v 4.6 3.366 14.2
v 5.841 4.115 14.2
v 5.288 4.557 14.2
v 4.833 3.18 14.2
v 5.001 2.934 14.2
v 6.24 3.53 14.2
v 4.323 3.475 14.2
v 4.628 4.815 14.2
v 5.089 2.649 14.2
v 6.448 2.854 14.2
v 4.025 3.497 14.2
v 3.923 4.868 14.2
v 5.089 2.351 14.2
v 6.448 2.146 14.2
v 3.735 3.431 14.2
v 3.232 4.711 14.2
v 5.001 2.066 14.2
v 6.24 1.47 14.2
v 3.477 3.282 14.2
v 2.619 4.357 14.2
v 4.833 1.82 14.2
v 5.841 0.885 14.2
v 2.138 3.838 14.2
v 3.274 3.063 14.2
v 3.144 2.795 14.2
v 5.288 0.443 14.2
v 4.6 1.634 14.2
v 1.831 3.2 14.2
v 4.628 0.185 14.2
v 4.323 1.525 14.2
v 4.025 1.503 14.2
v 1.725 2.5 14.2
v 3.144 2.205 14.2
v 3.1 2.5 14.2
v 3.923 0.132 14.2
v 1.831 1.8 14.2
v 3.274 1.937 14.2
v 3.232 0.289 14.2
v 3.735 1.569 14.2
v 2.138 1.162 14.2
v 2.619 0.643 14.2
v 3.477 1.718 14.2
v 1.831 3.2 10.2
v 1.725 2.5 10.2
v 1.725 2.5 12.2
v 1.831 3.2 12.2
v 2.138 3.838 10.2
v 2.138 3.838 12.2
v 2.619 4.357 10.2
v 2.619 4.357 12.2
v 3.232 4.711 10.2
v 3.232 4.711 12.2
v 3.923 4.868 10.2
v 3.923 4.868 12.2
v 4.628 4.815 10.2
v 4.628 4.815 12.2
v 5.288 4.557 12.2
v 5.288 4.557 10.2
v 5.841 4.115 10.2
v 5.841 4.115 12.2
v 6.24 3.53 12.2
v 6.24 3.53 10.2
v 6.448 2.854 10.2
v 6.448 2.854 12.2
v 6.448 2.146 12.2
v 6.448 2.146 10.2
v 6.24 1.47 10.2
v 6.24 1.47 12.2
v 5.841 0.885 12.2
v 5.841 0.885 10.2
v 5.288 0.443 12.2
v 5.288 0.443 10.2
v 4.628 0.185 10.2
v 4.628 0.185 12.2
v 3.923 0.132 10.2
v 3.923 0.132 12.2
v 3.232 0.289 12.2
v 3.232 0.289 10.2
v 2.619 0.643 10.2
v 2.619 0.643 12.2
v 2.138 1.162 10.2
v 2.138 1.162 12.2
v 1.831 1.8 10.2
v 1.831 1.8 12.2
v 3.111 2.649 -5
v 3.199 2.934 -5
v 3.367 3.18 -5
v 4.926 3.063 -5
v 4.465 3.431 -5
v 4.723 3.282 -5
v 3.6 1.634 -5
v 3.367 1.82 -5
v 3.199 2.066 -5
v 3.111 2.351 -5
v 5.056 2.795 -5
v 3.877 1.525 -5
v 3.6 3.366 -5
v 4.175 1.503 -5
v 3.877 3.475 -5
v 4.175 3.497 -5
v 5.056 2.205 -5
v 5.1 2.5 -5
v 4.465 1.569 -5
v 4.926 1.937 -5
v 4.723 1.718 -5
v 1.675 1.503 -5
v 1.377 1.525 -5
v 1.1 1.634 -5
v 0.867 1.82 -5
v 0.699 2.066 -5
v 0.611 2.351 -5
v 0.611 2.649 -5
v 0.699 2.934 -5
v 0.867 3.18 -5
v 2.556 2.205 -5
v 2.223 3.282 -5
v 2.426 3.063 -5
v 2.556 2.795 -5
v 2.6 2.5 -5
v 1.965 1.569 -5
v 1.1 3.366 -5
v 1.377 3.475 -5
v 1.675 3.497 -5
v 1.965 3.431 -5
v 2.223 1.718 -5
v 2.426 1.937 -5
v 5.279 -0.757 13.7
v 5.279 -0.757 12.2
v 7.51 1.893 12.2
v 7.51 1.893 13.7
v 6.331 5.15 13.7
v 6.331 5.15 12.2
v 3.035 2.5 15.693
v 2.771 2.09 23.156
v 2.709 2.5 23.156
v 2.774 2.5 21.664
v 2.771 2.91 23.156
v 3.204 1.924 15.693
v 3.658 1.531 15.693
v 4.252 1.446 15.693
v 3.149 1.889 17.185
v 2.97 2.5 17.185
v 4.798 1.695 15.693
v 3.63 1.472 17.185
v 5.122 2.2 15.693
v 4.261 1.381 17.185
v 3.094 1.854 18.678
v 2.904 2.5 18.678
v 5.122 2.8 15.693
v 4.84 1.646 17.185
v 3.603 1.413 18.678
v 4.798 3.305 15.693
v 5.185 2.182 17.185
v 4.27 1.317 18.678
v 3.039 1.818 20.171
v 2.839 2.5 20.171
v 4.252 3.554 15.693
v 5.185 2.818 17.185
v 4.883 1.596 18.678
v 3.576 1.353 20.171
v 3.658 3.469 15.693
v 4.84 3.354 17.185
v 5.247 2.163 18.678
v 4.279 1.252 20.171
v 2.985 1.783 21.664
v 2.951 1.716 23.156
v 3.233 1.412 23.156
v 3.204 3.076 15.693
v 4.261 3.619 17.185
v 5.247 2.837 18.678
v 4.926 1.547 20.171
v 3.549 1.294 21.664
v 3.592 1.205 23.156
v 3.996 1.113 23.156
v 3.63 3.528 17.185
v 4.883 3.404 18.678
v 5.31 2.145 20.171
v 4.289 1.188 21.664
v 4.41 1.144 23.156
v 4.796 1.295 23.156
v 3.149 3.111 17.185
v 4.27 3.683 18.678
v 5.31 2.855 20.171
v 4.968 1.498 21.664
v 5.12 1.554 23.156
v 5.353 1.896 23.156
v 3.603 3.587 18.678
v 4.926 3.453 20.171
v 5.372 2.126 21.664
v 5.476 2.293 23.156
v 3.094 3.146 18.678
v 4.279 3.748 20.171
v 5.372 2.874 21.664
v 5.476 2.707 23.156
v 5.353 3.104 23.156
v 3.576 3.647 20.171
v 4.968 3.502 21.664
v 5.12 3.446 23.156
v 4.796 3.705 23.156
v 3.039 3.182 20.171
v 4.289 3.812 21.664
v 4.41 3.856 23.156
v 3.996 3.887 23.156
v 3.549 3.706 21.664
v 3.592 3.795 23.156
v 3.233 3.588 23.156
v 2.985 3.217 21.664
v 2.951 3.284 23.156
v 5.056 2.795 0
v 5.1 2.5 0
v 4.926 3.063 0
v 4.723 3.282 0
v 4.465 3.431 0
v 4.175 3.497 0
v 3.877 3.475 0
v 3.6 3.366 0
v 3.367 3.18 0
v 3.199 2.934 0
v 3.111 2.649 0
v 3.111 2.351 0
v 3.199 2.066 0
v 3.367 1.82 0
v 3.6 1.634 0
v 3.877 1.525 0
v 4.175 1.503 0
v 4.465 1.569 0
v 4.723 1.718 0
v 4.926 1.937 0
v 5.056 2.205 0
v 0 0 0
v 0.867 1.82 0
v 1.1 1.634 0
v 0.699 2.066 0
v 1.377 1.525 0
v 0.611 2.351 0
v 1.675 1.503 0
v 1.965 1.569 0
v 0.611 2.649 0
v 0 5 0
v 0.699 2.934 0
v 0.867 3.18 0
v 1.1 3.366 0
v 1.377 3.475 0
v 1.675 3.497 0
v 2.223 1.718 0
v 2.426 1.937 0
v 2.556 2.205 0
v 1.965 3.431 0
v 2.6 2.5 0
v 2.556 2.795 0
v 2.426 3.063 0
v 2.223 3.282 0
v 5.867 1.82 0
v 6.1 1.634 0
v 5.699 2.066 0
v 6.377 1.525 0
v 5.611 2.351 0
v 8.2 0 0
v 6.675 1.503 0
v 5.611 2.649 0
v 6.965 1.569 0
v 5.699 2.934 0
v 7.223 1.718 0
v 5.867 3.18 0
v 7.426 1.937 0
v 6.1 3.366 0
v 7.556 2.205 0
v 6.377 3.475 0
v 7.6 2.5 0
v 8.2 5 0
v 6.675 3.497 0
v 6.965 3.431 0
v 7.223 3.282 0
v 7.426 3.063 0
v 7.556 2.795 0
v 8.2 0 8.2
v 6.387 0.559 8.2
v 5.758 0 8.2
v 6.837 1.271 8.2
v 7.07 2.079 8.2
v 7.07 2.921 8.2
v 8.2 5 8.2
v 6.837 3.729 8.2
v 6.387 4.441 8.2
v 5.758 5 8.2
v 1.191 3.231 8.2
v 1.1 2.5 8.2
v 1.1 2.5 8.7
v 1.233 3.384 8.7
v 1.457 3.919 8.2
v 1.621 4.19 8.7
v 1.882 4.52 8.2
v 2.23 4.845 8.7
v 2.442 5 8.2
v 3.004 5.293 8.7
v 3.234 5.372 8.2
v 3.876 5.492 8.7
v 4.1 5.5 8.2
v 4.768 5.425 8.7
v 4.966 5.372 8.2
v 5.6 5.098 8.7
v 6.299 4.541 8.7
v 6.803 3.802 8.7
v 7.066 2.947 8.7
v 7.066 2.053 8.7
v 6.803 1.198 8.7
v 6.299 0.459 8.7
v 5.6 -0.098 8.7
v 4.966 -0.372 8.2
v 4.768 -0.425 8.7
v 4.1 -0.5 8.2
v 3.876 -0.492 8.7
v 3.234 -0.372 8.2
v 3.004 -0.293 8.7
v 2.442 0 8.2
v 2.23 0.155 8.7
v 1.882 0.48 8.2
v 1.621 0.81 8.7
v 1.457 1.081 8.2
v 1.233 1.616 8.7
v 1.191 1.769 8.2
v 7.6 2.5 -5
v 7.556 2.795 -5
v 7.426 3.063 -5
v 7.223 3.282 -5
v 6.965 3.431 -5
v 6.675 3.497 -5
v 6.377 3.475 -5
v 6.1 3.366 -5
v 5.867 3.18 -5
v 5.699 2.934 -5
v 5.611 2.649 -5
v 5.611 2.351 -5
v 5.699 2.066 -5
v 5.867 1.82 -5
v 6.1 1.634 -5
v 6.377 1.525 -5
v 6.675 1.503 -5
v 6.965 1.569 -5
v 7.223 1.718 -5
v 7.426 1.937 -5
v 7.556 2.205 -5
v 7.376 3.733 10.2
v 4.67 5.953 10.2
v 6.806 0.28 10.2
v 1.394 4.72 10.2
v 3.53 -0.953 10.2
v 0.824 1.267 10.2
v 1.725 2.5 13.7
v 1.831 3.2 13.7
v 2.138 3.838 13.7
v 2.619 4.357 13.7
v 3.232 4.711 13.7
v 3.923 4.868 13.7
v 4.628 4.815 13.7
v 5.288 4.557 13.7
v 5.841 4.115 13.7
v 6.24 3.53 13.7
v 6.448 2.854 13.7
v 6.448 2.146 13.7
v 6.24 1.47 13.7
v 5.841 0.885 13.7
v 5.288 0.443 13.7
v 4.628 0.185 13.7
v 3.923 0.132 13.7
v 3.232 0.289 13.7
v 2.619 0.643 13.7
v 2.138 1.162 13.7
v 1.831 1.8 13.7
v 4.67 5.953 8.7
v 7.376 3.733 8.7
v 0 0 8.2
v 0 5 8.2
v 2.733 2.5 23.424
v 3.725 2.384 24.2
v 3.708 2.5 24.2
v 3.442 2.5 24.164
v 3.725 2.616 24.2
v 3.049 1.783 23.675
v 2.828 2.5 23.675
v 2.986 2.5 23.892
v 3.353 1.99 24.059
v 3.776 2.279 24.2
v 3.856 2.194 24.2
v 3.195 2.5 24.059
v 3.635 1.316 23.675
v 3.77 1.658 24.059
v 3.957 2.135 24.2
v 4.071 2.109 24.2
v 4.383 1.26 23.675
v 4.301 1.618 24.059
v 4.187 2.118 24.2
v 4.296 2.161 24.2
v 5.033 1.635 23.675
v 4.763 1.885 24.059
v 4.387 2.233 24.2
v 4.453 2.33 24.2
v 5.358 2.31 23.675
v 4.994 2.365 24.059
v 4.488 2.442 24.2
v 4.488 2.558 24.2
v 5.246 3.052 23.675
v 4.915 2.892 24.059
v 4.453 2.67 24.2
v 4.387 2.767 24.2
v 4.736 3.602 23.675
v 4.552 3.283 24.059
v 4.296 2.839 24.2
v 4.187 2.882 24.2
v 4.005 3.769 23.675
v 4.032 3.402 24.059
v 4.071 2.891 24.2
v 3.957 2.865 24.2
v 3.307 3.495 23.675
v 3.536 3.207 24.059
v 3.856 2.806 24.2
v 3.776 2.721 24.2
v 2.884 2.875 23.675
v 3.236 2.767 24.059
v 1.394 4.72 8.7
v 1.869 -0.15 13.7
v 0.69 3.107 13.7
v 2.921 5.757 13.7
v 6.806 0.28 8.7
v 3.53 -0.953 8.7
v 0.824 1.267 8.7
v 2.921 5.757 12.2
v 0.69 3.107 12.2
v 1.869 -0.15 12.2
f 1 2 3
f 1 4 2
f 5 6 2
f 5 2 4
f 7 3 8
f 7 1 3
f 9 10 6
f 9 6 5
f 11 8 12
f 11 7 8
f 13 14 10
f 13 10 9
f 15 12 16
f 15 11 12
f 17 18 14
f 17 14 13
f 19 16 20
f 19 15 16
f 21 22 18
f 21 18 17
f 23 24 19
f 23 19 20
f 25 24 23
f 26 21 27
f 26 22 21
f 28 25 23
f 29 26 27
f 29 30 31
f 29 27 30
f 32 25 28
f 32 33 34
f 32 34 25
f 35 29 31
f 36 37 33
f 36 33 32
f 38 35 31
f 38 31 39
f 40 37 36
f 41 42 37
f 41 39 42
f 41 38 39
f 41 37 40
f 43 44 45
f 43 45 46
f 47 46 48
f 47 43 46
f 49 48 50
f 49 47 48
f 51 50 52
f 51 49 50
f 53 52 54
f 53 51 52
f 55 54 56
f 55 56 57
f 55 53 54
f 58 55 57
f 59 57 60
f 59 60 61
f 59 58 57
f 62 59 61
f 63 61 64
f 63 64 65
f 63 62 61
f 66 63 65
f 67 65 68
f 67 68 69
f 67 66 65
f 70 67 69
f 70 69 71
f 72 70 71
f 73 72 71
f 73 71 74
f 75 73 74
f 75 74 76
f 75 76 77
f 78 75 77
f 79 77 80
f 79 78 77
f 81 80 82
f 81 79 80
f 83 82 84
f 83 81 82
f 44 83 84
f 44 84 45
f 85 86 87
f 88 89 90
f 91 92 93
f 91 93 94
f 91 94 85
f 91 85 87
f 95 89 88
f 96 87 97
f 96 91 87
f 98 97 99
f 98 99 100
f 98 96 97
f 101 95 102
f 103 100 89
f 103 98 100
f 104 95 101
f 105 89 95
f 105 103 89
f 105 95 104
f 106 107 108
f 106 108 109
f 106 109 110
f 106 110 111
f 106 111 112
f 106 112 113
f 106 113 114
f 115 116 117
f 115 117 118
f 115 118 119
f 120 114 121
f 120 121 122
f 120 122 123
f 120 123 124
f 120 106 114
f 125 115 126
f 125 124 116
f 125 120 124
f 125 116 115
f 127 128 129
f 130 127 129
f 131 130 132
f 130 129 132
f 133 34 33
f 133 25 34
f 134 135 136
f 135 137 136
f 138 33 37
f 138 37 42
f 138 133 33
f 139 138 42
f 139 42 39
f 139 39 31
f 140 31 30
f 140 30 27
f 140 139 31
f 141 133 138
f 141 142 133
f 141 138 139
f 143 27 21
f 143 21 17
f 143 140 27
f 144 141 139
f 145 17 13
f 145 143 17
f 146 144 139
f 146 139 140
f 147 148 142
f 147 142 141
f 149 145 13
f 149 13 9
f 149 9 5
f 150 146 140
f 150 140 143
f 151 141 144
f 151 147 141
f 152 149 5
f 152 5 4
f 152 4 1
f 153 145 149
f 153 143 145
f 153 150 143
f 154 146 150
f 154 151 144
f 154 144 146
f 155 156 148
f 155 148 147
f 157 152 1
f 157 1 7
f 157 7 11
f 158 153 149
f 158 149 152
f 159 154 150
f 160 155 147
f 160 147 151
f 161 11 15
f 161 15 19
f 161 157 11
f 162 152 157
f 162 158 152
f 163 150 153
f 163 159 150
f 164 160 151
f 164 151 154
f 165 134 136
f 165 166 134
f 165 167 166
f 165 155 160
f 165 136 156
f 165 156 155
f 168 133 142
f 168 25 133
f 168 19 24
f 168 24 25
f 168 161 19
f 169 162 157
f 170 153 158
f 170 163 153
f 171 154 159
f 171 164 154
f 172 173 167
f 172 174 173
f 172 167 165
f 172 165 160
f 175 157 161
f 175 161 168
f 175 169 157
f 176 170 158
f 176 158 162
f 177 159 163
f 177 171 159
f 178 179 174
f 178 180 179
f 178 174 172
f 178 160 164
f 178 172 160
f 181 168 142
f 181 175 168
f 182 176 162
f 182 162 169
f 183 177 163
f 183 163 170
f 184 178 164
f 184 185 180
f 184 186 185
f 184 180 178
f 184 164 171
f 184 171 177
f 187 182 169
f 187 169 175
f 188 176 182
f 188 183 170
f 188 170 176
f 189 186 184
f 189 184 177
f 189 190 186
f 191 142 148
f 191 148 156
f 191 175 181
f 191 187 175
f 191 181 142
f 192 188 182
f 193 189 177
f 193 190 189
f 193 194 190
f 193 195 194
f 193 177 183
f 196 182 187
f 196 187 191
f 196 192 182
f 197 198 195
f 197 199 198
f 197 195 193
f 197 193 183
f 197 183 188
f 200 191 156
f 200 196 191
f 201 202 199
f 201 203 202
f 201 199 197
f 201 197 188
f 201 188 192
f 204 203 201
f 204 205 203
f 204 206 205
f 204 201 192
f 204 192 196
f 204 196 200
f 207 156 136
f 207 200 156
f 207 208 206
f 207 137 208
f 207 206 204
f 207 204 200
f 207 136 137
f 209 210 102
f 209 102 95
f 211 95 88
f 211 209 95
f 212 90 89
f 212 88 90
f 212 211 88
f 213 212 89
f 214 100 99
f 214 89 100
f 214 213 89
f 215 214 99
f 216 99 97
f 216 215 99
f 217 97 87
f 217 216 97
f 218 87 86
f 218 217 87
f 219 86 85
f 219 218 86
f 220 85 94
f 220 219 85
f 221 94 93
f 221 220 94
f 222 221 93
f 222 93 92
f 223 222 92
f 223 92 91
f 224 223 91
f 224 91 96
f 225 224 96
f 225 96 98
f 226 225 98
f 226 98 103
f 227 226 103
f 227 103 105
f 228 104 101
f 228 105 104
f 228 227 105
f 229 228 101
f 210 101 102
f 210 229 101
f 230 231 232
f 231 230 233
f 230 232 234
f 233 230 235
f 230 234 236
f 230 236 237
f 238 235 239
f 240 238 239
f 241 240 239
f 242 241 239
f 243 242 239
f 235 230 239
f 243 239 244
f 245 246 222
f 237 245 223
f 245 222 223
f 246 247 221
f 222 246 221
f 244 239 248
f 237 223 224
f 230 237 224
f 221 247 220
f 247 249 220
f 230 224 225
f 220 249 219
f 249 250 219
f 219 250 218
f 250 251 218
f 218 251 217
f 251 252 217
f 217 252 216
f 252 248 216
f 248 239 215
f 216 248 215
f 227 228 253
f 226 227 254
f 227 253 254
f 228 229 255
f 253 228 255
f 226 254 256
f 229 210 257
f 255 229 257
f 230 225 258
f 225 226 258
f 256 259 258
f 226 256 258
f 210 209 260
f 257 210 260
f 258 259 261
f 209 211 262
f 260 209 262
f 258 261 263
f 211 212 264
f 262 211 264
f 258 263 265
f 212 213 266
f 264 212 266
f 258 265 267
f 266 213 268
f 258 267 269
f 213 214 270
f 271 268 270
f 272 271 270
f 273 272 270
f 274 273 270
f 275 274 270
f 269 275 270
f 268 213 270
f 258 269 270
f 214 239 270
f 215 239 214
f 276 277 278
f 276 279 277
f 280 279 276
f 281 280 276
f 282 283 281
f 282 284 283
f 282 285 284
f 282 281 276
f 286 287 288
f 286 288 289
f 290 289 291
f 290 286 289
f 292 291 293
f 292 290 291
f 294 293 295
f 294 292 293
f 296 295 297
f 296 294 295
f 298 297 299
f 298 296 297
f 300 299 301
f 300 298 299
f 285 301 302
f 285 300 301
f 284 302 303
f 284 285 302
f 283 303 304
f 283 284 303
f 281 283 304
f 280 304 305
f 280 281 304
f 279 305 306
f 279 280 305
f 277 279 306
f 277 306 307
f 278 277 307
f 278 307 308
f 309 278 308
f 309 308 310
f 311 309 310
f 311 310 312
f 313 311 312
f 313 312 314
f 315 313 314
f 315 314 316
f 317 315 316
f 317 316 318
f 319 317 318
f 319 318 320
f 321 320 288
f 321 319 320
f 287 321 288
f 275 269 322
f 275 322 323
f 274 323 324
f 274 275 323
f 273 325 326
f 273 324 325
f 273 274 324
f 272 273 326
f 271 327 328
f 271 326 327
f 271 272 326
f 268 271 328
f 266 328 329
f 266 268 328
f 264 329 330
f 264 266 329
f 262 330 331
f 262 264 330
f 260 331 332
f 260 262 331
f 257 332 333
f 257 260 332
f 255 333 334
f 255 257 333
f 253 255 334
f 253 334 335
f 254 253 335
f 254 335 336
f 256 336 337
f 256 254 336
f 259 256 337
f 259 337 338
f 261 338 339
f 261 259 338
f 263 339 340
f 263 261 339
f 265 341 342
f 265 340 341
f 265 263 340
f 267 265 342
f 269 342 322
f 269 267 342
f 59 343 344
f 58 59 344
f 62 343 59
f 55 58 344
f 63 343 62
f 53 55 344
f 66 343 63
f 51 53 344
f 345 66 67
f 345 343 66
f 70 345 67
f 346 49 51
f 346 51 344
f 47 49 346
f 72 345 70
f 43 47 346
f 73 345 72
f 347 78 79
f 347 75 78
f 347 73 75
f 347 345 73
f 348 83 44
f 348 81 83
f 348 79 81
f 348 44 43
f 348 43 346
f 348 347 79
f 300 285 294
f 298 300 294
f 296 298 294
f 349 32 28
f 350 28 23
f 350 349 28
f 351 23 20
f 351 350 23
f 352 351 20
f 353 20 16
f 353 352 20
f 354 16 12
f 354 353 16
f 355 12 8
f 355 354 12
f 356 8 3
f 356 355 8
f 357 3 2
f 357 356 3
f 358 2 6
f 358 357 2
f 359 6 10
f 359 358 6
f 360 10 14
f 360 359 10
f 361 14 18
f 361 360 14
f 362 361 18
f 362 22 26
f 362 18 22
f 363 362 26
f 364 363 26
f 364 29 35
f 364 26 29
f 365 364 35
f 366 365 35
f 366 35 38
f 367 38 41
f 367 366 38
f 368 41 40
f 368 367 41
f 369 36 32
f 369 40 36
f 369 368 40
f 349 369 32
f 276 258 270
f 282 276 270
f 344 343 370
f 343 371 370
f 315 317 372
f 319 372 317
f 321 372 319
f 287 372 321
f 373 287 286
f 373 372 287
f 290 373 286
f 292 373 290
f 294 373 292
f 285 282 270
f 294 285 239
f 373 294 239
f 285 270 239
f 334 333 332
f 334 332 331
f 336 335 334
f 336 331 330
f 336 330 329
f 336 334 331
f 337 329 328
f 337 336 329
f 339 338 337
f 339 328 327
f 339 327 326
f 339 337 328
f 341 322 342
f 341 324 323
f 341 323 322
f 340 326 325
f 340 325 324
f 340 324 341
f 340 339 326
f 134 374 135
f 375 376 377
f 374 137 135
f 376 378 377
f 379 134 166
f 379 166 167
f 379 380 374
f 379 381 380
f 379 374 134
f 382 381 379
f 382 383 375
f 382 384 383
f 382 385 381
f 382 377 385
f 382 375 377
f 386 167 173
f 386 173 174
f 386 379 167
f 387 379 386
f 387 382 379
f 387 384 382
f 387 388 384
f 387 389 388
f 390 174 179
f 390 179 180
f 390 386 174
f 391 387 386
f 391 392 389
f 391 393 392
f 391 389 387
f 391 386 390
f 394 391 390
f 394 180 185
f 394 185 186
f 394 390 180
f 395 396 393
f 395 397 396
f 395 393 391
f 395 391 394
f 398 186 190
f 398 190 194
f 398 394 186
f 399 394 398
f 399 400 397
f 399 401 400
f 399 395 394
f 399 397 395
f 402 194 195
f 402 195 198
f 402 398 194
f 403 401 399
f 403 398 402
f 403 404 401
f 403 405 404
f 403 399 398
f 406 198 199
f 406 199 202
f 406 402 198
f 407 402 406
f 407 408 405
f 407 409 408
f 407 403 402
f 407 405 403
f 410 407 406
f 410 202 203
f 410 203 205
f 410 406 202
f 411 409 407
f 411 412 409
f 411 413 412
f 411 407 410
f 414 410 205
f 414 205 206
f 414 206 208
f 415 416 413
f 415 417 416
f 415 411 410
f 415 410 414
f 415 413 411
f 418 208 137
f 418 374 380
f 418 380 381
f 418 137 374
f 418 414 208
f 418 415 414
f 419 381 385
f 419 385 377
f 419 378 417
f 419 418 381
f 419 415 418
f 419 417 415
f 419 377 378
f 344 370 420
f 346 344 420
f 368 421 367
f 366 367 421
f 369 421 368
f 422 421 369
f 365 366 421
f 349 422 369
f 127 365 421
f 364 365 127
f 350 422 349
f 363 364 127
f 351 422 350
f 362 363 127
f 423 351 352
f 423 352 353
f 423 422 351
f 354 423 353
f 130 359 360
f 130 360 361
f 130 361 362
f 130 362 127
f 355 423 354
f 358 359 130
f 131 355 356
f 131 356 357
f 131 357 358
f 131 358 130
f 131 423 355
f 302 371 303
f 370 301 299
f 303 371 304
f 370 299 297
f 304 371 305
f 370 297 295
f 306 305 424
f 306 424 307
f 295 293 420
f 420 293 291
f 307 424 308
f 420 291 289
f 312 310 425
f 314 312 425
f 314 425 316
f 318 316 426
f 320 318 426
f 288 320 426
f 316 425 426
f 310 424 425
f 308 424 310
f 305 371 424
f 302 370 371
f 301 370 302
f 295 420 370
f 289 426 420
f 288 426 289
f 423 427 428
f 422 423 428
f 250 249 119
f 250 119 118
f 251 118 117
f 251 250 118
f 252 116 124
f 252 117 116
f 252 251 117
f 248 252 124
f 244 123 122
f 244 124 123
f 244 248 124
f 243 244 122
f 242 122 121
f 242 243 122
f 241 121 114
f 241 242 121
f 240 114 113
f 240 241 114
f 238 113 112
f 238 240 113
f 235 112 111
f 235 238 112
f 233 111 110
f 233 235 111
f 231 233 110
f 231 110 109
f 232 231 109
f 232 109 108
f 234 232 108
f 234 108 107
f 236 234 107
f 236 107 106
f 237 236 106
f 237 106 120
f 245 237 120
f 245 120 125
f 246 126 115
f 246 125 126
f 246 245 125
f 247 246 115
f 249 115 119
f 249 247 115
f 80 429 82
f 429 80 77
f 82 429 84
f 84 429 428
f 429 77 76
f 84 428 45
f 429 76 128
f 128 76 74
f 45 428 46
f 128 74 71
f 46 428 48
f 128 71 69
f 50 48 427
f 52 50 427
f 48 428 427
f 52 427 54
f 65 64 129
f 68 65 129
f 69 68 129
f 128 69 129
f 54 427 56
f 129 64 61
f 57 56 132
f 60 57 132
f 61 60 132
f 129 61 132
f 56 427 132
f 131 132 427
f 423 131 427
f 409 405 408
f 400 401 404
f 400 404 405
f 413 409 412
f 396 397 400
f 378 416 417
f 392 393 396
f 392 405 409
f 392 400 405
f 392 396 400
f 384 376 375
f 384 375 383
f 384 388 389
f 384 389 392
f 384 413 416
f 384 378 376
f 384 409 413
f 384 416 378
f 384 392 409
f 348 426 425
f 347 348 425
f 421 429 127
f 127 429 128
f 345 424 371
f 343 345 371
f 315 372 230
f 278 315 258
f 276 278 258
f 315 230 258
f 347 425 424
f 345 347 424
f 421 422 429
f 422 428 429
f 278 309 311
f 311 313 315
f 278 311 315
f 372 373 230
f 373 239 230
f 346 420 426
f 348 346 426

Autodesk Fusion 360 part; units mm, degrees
sketch "Skizze1" plane through (0, 0, 0) normal (0, 0, 1) x (1, 0, 0)
  line L0 (0, 0) -> (8.2, 0)
  line L1 (8.2, 0) -> (8.2, 5)
  line L2 (8.2, 5) -> (0, 5)
  line L3 (0, 5) -> (0, 0)
  dimension "d1" = 8.2
  dimension "d2" = 5
extrude "Extrusion1" add sketch "Skizze1" along normal blind 8.2
sketch "Skizze2" plane through (0, 0, 8.2) normal (0, 0, 1) x (-1, 0, 0)
  line L0 (0, -5) -> (0, 0)
  line L1 (0, 0) -> (-8.2, 0)
  line L2 (-8.2, 0) -> (-8.2, -5)
  line L3 (-8.2, -5) -> (0, -5)
  circle A0 centre (-4.1, -2.5) radius 3
  dimension "d5" = 6
  dimension "d6" = 2.5
  dimension "d38" = 4.1
extrude "Extrusion2" add sketch "Skizze2" along normal blind 0.5 contours L3 A0 | L1 L3 A0 | L1 A0
sketch "Skizze3" plane through (0, 0, 8.7) normal (0, 0, 1) x (-1, 0, 0)
  circle A0 centre (-4.1, -2.5) radius 3
  circle A1 centre (-4.1, -2.5) radius 2.375
  dimension "d9" = 4.75
extrude "Extrusion3" add sketch "Skizze3" along normal blind 5.5 contours A1
sketch "Skizze4" plane through (0, 0, 14.2) normal (0, 0, 1) x (-1, 0, 0)
  circle A0 centre (-4.1, -2.5) radius 2.375
  circle A1 centre (-4.1, -2.5) radius 1.25
  dimension "d12" = 2.5
sketch "Skizze5" plane through (0, 0, 0) normal (0, 0, -1) x (1, 0, 0)
  line L0 (0, 0) -> (0, -5)
  line L1 (0, -5) -> (8.2, -5)
  line L2 (8.2, -5) -> (8.2, 0)
  line L3 (8.2, 0) -> (0, 0)
  circle A0 centre (4.1, -2.5) radius 1
  circle A1 centre (6.6, -2.5) radius 1
  circle A2 centre (1.6, -2.5) radius 1
  dimension "d17" = 2
  dimension "d18" = 2.5
  dimension "d21" = 2.5
  dimension "d22" = 0
  dimension "d25" = -2.5
  dimension "d26" = 0
  dimension "d39" = 4.1
extrude "Extrusion5" add sketch "Skizze5" along normal blind 5 contours A0 | A1 | A2
sketch "Skizze6" plane through (0, 0, 8.7) normal (0, 0, 1) x (-1, 0, 0)
  circle A0 centre (-4.1, -2.5) radius 2.375
  circle A1 centre (-4.1, -2.5) radius 3
  line L0 (-7.3757, -3.7328) -> (-4.6702, -5.9532)
  line L1 (-4.6702, -5.9532) -> (-1.3945, -4.7204)
  line L2 (-1.3945, -4.7204) -> (-0.8243, -1.2672)
  line L3 (-0.8243, -1.2672) -> (-3.5298, 0.9532)
  line L4 (-3.5298, 0.9532) -> (-6.8055, -0.2796)
  line L5 (-6.8055, -0.2796) -> (-7.3757, -3.7328)
  point P0 (-4.1, -2.5)
  dimension "d29" = 3.5
extrude "Extrusion6" add sketch "Skizze6" along normal blind 1.5 contours A1 | L0 L1 L2 L3 L4 L5
ref_plane "Arbeitsebene1" through (4.1, 2.5, 12.2) normal (0, 0, 1) x (-1, 0, 0)
sketch "Skizze8" plane through (4.1, 2.5, 12.2) normal (0, 0, 1) x (1, 0, 0)
  line L0 (-1.1793, 3.2572) -> (-3.4105, 0.6073)
  line L1 (-3.4105, 0.6073) -> (-2.2311, -2.6499)
  line L2 (-2.2311, -2.6499) -> (1.1793, -3.2572)
  line L3 (1.1793, -3.2572) -> (3.4105, -0.6073)
  line L4 (3.4105, -0.6073) -> (2.2311, 2.6499)
  line L5 (2.2311, 2.6499) -> (-1.1793, 3.2572)
  dimension "d40" = 3
extrude "Extrusion9" add sketch "Skizze8" along normal blind 1.5
sketch "Skizze9" plane through (0, 0, 14.2) normal (0, 0, 1) x (-1, 0, 0)
  circle A0 centre (-4.1, -2.5) radius 2.375
  circle A1 centre (-4.1, -2.5) radius 1
  dimension "d43" = 2
extrude "Extrusion10" add sketch "Skizze9" along normal blind 10 draft 2.5 contours A1
fillet "Abrundung2" radius 1 1 edges at (5.4394, 1.9805, 24.2)
